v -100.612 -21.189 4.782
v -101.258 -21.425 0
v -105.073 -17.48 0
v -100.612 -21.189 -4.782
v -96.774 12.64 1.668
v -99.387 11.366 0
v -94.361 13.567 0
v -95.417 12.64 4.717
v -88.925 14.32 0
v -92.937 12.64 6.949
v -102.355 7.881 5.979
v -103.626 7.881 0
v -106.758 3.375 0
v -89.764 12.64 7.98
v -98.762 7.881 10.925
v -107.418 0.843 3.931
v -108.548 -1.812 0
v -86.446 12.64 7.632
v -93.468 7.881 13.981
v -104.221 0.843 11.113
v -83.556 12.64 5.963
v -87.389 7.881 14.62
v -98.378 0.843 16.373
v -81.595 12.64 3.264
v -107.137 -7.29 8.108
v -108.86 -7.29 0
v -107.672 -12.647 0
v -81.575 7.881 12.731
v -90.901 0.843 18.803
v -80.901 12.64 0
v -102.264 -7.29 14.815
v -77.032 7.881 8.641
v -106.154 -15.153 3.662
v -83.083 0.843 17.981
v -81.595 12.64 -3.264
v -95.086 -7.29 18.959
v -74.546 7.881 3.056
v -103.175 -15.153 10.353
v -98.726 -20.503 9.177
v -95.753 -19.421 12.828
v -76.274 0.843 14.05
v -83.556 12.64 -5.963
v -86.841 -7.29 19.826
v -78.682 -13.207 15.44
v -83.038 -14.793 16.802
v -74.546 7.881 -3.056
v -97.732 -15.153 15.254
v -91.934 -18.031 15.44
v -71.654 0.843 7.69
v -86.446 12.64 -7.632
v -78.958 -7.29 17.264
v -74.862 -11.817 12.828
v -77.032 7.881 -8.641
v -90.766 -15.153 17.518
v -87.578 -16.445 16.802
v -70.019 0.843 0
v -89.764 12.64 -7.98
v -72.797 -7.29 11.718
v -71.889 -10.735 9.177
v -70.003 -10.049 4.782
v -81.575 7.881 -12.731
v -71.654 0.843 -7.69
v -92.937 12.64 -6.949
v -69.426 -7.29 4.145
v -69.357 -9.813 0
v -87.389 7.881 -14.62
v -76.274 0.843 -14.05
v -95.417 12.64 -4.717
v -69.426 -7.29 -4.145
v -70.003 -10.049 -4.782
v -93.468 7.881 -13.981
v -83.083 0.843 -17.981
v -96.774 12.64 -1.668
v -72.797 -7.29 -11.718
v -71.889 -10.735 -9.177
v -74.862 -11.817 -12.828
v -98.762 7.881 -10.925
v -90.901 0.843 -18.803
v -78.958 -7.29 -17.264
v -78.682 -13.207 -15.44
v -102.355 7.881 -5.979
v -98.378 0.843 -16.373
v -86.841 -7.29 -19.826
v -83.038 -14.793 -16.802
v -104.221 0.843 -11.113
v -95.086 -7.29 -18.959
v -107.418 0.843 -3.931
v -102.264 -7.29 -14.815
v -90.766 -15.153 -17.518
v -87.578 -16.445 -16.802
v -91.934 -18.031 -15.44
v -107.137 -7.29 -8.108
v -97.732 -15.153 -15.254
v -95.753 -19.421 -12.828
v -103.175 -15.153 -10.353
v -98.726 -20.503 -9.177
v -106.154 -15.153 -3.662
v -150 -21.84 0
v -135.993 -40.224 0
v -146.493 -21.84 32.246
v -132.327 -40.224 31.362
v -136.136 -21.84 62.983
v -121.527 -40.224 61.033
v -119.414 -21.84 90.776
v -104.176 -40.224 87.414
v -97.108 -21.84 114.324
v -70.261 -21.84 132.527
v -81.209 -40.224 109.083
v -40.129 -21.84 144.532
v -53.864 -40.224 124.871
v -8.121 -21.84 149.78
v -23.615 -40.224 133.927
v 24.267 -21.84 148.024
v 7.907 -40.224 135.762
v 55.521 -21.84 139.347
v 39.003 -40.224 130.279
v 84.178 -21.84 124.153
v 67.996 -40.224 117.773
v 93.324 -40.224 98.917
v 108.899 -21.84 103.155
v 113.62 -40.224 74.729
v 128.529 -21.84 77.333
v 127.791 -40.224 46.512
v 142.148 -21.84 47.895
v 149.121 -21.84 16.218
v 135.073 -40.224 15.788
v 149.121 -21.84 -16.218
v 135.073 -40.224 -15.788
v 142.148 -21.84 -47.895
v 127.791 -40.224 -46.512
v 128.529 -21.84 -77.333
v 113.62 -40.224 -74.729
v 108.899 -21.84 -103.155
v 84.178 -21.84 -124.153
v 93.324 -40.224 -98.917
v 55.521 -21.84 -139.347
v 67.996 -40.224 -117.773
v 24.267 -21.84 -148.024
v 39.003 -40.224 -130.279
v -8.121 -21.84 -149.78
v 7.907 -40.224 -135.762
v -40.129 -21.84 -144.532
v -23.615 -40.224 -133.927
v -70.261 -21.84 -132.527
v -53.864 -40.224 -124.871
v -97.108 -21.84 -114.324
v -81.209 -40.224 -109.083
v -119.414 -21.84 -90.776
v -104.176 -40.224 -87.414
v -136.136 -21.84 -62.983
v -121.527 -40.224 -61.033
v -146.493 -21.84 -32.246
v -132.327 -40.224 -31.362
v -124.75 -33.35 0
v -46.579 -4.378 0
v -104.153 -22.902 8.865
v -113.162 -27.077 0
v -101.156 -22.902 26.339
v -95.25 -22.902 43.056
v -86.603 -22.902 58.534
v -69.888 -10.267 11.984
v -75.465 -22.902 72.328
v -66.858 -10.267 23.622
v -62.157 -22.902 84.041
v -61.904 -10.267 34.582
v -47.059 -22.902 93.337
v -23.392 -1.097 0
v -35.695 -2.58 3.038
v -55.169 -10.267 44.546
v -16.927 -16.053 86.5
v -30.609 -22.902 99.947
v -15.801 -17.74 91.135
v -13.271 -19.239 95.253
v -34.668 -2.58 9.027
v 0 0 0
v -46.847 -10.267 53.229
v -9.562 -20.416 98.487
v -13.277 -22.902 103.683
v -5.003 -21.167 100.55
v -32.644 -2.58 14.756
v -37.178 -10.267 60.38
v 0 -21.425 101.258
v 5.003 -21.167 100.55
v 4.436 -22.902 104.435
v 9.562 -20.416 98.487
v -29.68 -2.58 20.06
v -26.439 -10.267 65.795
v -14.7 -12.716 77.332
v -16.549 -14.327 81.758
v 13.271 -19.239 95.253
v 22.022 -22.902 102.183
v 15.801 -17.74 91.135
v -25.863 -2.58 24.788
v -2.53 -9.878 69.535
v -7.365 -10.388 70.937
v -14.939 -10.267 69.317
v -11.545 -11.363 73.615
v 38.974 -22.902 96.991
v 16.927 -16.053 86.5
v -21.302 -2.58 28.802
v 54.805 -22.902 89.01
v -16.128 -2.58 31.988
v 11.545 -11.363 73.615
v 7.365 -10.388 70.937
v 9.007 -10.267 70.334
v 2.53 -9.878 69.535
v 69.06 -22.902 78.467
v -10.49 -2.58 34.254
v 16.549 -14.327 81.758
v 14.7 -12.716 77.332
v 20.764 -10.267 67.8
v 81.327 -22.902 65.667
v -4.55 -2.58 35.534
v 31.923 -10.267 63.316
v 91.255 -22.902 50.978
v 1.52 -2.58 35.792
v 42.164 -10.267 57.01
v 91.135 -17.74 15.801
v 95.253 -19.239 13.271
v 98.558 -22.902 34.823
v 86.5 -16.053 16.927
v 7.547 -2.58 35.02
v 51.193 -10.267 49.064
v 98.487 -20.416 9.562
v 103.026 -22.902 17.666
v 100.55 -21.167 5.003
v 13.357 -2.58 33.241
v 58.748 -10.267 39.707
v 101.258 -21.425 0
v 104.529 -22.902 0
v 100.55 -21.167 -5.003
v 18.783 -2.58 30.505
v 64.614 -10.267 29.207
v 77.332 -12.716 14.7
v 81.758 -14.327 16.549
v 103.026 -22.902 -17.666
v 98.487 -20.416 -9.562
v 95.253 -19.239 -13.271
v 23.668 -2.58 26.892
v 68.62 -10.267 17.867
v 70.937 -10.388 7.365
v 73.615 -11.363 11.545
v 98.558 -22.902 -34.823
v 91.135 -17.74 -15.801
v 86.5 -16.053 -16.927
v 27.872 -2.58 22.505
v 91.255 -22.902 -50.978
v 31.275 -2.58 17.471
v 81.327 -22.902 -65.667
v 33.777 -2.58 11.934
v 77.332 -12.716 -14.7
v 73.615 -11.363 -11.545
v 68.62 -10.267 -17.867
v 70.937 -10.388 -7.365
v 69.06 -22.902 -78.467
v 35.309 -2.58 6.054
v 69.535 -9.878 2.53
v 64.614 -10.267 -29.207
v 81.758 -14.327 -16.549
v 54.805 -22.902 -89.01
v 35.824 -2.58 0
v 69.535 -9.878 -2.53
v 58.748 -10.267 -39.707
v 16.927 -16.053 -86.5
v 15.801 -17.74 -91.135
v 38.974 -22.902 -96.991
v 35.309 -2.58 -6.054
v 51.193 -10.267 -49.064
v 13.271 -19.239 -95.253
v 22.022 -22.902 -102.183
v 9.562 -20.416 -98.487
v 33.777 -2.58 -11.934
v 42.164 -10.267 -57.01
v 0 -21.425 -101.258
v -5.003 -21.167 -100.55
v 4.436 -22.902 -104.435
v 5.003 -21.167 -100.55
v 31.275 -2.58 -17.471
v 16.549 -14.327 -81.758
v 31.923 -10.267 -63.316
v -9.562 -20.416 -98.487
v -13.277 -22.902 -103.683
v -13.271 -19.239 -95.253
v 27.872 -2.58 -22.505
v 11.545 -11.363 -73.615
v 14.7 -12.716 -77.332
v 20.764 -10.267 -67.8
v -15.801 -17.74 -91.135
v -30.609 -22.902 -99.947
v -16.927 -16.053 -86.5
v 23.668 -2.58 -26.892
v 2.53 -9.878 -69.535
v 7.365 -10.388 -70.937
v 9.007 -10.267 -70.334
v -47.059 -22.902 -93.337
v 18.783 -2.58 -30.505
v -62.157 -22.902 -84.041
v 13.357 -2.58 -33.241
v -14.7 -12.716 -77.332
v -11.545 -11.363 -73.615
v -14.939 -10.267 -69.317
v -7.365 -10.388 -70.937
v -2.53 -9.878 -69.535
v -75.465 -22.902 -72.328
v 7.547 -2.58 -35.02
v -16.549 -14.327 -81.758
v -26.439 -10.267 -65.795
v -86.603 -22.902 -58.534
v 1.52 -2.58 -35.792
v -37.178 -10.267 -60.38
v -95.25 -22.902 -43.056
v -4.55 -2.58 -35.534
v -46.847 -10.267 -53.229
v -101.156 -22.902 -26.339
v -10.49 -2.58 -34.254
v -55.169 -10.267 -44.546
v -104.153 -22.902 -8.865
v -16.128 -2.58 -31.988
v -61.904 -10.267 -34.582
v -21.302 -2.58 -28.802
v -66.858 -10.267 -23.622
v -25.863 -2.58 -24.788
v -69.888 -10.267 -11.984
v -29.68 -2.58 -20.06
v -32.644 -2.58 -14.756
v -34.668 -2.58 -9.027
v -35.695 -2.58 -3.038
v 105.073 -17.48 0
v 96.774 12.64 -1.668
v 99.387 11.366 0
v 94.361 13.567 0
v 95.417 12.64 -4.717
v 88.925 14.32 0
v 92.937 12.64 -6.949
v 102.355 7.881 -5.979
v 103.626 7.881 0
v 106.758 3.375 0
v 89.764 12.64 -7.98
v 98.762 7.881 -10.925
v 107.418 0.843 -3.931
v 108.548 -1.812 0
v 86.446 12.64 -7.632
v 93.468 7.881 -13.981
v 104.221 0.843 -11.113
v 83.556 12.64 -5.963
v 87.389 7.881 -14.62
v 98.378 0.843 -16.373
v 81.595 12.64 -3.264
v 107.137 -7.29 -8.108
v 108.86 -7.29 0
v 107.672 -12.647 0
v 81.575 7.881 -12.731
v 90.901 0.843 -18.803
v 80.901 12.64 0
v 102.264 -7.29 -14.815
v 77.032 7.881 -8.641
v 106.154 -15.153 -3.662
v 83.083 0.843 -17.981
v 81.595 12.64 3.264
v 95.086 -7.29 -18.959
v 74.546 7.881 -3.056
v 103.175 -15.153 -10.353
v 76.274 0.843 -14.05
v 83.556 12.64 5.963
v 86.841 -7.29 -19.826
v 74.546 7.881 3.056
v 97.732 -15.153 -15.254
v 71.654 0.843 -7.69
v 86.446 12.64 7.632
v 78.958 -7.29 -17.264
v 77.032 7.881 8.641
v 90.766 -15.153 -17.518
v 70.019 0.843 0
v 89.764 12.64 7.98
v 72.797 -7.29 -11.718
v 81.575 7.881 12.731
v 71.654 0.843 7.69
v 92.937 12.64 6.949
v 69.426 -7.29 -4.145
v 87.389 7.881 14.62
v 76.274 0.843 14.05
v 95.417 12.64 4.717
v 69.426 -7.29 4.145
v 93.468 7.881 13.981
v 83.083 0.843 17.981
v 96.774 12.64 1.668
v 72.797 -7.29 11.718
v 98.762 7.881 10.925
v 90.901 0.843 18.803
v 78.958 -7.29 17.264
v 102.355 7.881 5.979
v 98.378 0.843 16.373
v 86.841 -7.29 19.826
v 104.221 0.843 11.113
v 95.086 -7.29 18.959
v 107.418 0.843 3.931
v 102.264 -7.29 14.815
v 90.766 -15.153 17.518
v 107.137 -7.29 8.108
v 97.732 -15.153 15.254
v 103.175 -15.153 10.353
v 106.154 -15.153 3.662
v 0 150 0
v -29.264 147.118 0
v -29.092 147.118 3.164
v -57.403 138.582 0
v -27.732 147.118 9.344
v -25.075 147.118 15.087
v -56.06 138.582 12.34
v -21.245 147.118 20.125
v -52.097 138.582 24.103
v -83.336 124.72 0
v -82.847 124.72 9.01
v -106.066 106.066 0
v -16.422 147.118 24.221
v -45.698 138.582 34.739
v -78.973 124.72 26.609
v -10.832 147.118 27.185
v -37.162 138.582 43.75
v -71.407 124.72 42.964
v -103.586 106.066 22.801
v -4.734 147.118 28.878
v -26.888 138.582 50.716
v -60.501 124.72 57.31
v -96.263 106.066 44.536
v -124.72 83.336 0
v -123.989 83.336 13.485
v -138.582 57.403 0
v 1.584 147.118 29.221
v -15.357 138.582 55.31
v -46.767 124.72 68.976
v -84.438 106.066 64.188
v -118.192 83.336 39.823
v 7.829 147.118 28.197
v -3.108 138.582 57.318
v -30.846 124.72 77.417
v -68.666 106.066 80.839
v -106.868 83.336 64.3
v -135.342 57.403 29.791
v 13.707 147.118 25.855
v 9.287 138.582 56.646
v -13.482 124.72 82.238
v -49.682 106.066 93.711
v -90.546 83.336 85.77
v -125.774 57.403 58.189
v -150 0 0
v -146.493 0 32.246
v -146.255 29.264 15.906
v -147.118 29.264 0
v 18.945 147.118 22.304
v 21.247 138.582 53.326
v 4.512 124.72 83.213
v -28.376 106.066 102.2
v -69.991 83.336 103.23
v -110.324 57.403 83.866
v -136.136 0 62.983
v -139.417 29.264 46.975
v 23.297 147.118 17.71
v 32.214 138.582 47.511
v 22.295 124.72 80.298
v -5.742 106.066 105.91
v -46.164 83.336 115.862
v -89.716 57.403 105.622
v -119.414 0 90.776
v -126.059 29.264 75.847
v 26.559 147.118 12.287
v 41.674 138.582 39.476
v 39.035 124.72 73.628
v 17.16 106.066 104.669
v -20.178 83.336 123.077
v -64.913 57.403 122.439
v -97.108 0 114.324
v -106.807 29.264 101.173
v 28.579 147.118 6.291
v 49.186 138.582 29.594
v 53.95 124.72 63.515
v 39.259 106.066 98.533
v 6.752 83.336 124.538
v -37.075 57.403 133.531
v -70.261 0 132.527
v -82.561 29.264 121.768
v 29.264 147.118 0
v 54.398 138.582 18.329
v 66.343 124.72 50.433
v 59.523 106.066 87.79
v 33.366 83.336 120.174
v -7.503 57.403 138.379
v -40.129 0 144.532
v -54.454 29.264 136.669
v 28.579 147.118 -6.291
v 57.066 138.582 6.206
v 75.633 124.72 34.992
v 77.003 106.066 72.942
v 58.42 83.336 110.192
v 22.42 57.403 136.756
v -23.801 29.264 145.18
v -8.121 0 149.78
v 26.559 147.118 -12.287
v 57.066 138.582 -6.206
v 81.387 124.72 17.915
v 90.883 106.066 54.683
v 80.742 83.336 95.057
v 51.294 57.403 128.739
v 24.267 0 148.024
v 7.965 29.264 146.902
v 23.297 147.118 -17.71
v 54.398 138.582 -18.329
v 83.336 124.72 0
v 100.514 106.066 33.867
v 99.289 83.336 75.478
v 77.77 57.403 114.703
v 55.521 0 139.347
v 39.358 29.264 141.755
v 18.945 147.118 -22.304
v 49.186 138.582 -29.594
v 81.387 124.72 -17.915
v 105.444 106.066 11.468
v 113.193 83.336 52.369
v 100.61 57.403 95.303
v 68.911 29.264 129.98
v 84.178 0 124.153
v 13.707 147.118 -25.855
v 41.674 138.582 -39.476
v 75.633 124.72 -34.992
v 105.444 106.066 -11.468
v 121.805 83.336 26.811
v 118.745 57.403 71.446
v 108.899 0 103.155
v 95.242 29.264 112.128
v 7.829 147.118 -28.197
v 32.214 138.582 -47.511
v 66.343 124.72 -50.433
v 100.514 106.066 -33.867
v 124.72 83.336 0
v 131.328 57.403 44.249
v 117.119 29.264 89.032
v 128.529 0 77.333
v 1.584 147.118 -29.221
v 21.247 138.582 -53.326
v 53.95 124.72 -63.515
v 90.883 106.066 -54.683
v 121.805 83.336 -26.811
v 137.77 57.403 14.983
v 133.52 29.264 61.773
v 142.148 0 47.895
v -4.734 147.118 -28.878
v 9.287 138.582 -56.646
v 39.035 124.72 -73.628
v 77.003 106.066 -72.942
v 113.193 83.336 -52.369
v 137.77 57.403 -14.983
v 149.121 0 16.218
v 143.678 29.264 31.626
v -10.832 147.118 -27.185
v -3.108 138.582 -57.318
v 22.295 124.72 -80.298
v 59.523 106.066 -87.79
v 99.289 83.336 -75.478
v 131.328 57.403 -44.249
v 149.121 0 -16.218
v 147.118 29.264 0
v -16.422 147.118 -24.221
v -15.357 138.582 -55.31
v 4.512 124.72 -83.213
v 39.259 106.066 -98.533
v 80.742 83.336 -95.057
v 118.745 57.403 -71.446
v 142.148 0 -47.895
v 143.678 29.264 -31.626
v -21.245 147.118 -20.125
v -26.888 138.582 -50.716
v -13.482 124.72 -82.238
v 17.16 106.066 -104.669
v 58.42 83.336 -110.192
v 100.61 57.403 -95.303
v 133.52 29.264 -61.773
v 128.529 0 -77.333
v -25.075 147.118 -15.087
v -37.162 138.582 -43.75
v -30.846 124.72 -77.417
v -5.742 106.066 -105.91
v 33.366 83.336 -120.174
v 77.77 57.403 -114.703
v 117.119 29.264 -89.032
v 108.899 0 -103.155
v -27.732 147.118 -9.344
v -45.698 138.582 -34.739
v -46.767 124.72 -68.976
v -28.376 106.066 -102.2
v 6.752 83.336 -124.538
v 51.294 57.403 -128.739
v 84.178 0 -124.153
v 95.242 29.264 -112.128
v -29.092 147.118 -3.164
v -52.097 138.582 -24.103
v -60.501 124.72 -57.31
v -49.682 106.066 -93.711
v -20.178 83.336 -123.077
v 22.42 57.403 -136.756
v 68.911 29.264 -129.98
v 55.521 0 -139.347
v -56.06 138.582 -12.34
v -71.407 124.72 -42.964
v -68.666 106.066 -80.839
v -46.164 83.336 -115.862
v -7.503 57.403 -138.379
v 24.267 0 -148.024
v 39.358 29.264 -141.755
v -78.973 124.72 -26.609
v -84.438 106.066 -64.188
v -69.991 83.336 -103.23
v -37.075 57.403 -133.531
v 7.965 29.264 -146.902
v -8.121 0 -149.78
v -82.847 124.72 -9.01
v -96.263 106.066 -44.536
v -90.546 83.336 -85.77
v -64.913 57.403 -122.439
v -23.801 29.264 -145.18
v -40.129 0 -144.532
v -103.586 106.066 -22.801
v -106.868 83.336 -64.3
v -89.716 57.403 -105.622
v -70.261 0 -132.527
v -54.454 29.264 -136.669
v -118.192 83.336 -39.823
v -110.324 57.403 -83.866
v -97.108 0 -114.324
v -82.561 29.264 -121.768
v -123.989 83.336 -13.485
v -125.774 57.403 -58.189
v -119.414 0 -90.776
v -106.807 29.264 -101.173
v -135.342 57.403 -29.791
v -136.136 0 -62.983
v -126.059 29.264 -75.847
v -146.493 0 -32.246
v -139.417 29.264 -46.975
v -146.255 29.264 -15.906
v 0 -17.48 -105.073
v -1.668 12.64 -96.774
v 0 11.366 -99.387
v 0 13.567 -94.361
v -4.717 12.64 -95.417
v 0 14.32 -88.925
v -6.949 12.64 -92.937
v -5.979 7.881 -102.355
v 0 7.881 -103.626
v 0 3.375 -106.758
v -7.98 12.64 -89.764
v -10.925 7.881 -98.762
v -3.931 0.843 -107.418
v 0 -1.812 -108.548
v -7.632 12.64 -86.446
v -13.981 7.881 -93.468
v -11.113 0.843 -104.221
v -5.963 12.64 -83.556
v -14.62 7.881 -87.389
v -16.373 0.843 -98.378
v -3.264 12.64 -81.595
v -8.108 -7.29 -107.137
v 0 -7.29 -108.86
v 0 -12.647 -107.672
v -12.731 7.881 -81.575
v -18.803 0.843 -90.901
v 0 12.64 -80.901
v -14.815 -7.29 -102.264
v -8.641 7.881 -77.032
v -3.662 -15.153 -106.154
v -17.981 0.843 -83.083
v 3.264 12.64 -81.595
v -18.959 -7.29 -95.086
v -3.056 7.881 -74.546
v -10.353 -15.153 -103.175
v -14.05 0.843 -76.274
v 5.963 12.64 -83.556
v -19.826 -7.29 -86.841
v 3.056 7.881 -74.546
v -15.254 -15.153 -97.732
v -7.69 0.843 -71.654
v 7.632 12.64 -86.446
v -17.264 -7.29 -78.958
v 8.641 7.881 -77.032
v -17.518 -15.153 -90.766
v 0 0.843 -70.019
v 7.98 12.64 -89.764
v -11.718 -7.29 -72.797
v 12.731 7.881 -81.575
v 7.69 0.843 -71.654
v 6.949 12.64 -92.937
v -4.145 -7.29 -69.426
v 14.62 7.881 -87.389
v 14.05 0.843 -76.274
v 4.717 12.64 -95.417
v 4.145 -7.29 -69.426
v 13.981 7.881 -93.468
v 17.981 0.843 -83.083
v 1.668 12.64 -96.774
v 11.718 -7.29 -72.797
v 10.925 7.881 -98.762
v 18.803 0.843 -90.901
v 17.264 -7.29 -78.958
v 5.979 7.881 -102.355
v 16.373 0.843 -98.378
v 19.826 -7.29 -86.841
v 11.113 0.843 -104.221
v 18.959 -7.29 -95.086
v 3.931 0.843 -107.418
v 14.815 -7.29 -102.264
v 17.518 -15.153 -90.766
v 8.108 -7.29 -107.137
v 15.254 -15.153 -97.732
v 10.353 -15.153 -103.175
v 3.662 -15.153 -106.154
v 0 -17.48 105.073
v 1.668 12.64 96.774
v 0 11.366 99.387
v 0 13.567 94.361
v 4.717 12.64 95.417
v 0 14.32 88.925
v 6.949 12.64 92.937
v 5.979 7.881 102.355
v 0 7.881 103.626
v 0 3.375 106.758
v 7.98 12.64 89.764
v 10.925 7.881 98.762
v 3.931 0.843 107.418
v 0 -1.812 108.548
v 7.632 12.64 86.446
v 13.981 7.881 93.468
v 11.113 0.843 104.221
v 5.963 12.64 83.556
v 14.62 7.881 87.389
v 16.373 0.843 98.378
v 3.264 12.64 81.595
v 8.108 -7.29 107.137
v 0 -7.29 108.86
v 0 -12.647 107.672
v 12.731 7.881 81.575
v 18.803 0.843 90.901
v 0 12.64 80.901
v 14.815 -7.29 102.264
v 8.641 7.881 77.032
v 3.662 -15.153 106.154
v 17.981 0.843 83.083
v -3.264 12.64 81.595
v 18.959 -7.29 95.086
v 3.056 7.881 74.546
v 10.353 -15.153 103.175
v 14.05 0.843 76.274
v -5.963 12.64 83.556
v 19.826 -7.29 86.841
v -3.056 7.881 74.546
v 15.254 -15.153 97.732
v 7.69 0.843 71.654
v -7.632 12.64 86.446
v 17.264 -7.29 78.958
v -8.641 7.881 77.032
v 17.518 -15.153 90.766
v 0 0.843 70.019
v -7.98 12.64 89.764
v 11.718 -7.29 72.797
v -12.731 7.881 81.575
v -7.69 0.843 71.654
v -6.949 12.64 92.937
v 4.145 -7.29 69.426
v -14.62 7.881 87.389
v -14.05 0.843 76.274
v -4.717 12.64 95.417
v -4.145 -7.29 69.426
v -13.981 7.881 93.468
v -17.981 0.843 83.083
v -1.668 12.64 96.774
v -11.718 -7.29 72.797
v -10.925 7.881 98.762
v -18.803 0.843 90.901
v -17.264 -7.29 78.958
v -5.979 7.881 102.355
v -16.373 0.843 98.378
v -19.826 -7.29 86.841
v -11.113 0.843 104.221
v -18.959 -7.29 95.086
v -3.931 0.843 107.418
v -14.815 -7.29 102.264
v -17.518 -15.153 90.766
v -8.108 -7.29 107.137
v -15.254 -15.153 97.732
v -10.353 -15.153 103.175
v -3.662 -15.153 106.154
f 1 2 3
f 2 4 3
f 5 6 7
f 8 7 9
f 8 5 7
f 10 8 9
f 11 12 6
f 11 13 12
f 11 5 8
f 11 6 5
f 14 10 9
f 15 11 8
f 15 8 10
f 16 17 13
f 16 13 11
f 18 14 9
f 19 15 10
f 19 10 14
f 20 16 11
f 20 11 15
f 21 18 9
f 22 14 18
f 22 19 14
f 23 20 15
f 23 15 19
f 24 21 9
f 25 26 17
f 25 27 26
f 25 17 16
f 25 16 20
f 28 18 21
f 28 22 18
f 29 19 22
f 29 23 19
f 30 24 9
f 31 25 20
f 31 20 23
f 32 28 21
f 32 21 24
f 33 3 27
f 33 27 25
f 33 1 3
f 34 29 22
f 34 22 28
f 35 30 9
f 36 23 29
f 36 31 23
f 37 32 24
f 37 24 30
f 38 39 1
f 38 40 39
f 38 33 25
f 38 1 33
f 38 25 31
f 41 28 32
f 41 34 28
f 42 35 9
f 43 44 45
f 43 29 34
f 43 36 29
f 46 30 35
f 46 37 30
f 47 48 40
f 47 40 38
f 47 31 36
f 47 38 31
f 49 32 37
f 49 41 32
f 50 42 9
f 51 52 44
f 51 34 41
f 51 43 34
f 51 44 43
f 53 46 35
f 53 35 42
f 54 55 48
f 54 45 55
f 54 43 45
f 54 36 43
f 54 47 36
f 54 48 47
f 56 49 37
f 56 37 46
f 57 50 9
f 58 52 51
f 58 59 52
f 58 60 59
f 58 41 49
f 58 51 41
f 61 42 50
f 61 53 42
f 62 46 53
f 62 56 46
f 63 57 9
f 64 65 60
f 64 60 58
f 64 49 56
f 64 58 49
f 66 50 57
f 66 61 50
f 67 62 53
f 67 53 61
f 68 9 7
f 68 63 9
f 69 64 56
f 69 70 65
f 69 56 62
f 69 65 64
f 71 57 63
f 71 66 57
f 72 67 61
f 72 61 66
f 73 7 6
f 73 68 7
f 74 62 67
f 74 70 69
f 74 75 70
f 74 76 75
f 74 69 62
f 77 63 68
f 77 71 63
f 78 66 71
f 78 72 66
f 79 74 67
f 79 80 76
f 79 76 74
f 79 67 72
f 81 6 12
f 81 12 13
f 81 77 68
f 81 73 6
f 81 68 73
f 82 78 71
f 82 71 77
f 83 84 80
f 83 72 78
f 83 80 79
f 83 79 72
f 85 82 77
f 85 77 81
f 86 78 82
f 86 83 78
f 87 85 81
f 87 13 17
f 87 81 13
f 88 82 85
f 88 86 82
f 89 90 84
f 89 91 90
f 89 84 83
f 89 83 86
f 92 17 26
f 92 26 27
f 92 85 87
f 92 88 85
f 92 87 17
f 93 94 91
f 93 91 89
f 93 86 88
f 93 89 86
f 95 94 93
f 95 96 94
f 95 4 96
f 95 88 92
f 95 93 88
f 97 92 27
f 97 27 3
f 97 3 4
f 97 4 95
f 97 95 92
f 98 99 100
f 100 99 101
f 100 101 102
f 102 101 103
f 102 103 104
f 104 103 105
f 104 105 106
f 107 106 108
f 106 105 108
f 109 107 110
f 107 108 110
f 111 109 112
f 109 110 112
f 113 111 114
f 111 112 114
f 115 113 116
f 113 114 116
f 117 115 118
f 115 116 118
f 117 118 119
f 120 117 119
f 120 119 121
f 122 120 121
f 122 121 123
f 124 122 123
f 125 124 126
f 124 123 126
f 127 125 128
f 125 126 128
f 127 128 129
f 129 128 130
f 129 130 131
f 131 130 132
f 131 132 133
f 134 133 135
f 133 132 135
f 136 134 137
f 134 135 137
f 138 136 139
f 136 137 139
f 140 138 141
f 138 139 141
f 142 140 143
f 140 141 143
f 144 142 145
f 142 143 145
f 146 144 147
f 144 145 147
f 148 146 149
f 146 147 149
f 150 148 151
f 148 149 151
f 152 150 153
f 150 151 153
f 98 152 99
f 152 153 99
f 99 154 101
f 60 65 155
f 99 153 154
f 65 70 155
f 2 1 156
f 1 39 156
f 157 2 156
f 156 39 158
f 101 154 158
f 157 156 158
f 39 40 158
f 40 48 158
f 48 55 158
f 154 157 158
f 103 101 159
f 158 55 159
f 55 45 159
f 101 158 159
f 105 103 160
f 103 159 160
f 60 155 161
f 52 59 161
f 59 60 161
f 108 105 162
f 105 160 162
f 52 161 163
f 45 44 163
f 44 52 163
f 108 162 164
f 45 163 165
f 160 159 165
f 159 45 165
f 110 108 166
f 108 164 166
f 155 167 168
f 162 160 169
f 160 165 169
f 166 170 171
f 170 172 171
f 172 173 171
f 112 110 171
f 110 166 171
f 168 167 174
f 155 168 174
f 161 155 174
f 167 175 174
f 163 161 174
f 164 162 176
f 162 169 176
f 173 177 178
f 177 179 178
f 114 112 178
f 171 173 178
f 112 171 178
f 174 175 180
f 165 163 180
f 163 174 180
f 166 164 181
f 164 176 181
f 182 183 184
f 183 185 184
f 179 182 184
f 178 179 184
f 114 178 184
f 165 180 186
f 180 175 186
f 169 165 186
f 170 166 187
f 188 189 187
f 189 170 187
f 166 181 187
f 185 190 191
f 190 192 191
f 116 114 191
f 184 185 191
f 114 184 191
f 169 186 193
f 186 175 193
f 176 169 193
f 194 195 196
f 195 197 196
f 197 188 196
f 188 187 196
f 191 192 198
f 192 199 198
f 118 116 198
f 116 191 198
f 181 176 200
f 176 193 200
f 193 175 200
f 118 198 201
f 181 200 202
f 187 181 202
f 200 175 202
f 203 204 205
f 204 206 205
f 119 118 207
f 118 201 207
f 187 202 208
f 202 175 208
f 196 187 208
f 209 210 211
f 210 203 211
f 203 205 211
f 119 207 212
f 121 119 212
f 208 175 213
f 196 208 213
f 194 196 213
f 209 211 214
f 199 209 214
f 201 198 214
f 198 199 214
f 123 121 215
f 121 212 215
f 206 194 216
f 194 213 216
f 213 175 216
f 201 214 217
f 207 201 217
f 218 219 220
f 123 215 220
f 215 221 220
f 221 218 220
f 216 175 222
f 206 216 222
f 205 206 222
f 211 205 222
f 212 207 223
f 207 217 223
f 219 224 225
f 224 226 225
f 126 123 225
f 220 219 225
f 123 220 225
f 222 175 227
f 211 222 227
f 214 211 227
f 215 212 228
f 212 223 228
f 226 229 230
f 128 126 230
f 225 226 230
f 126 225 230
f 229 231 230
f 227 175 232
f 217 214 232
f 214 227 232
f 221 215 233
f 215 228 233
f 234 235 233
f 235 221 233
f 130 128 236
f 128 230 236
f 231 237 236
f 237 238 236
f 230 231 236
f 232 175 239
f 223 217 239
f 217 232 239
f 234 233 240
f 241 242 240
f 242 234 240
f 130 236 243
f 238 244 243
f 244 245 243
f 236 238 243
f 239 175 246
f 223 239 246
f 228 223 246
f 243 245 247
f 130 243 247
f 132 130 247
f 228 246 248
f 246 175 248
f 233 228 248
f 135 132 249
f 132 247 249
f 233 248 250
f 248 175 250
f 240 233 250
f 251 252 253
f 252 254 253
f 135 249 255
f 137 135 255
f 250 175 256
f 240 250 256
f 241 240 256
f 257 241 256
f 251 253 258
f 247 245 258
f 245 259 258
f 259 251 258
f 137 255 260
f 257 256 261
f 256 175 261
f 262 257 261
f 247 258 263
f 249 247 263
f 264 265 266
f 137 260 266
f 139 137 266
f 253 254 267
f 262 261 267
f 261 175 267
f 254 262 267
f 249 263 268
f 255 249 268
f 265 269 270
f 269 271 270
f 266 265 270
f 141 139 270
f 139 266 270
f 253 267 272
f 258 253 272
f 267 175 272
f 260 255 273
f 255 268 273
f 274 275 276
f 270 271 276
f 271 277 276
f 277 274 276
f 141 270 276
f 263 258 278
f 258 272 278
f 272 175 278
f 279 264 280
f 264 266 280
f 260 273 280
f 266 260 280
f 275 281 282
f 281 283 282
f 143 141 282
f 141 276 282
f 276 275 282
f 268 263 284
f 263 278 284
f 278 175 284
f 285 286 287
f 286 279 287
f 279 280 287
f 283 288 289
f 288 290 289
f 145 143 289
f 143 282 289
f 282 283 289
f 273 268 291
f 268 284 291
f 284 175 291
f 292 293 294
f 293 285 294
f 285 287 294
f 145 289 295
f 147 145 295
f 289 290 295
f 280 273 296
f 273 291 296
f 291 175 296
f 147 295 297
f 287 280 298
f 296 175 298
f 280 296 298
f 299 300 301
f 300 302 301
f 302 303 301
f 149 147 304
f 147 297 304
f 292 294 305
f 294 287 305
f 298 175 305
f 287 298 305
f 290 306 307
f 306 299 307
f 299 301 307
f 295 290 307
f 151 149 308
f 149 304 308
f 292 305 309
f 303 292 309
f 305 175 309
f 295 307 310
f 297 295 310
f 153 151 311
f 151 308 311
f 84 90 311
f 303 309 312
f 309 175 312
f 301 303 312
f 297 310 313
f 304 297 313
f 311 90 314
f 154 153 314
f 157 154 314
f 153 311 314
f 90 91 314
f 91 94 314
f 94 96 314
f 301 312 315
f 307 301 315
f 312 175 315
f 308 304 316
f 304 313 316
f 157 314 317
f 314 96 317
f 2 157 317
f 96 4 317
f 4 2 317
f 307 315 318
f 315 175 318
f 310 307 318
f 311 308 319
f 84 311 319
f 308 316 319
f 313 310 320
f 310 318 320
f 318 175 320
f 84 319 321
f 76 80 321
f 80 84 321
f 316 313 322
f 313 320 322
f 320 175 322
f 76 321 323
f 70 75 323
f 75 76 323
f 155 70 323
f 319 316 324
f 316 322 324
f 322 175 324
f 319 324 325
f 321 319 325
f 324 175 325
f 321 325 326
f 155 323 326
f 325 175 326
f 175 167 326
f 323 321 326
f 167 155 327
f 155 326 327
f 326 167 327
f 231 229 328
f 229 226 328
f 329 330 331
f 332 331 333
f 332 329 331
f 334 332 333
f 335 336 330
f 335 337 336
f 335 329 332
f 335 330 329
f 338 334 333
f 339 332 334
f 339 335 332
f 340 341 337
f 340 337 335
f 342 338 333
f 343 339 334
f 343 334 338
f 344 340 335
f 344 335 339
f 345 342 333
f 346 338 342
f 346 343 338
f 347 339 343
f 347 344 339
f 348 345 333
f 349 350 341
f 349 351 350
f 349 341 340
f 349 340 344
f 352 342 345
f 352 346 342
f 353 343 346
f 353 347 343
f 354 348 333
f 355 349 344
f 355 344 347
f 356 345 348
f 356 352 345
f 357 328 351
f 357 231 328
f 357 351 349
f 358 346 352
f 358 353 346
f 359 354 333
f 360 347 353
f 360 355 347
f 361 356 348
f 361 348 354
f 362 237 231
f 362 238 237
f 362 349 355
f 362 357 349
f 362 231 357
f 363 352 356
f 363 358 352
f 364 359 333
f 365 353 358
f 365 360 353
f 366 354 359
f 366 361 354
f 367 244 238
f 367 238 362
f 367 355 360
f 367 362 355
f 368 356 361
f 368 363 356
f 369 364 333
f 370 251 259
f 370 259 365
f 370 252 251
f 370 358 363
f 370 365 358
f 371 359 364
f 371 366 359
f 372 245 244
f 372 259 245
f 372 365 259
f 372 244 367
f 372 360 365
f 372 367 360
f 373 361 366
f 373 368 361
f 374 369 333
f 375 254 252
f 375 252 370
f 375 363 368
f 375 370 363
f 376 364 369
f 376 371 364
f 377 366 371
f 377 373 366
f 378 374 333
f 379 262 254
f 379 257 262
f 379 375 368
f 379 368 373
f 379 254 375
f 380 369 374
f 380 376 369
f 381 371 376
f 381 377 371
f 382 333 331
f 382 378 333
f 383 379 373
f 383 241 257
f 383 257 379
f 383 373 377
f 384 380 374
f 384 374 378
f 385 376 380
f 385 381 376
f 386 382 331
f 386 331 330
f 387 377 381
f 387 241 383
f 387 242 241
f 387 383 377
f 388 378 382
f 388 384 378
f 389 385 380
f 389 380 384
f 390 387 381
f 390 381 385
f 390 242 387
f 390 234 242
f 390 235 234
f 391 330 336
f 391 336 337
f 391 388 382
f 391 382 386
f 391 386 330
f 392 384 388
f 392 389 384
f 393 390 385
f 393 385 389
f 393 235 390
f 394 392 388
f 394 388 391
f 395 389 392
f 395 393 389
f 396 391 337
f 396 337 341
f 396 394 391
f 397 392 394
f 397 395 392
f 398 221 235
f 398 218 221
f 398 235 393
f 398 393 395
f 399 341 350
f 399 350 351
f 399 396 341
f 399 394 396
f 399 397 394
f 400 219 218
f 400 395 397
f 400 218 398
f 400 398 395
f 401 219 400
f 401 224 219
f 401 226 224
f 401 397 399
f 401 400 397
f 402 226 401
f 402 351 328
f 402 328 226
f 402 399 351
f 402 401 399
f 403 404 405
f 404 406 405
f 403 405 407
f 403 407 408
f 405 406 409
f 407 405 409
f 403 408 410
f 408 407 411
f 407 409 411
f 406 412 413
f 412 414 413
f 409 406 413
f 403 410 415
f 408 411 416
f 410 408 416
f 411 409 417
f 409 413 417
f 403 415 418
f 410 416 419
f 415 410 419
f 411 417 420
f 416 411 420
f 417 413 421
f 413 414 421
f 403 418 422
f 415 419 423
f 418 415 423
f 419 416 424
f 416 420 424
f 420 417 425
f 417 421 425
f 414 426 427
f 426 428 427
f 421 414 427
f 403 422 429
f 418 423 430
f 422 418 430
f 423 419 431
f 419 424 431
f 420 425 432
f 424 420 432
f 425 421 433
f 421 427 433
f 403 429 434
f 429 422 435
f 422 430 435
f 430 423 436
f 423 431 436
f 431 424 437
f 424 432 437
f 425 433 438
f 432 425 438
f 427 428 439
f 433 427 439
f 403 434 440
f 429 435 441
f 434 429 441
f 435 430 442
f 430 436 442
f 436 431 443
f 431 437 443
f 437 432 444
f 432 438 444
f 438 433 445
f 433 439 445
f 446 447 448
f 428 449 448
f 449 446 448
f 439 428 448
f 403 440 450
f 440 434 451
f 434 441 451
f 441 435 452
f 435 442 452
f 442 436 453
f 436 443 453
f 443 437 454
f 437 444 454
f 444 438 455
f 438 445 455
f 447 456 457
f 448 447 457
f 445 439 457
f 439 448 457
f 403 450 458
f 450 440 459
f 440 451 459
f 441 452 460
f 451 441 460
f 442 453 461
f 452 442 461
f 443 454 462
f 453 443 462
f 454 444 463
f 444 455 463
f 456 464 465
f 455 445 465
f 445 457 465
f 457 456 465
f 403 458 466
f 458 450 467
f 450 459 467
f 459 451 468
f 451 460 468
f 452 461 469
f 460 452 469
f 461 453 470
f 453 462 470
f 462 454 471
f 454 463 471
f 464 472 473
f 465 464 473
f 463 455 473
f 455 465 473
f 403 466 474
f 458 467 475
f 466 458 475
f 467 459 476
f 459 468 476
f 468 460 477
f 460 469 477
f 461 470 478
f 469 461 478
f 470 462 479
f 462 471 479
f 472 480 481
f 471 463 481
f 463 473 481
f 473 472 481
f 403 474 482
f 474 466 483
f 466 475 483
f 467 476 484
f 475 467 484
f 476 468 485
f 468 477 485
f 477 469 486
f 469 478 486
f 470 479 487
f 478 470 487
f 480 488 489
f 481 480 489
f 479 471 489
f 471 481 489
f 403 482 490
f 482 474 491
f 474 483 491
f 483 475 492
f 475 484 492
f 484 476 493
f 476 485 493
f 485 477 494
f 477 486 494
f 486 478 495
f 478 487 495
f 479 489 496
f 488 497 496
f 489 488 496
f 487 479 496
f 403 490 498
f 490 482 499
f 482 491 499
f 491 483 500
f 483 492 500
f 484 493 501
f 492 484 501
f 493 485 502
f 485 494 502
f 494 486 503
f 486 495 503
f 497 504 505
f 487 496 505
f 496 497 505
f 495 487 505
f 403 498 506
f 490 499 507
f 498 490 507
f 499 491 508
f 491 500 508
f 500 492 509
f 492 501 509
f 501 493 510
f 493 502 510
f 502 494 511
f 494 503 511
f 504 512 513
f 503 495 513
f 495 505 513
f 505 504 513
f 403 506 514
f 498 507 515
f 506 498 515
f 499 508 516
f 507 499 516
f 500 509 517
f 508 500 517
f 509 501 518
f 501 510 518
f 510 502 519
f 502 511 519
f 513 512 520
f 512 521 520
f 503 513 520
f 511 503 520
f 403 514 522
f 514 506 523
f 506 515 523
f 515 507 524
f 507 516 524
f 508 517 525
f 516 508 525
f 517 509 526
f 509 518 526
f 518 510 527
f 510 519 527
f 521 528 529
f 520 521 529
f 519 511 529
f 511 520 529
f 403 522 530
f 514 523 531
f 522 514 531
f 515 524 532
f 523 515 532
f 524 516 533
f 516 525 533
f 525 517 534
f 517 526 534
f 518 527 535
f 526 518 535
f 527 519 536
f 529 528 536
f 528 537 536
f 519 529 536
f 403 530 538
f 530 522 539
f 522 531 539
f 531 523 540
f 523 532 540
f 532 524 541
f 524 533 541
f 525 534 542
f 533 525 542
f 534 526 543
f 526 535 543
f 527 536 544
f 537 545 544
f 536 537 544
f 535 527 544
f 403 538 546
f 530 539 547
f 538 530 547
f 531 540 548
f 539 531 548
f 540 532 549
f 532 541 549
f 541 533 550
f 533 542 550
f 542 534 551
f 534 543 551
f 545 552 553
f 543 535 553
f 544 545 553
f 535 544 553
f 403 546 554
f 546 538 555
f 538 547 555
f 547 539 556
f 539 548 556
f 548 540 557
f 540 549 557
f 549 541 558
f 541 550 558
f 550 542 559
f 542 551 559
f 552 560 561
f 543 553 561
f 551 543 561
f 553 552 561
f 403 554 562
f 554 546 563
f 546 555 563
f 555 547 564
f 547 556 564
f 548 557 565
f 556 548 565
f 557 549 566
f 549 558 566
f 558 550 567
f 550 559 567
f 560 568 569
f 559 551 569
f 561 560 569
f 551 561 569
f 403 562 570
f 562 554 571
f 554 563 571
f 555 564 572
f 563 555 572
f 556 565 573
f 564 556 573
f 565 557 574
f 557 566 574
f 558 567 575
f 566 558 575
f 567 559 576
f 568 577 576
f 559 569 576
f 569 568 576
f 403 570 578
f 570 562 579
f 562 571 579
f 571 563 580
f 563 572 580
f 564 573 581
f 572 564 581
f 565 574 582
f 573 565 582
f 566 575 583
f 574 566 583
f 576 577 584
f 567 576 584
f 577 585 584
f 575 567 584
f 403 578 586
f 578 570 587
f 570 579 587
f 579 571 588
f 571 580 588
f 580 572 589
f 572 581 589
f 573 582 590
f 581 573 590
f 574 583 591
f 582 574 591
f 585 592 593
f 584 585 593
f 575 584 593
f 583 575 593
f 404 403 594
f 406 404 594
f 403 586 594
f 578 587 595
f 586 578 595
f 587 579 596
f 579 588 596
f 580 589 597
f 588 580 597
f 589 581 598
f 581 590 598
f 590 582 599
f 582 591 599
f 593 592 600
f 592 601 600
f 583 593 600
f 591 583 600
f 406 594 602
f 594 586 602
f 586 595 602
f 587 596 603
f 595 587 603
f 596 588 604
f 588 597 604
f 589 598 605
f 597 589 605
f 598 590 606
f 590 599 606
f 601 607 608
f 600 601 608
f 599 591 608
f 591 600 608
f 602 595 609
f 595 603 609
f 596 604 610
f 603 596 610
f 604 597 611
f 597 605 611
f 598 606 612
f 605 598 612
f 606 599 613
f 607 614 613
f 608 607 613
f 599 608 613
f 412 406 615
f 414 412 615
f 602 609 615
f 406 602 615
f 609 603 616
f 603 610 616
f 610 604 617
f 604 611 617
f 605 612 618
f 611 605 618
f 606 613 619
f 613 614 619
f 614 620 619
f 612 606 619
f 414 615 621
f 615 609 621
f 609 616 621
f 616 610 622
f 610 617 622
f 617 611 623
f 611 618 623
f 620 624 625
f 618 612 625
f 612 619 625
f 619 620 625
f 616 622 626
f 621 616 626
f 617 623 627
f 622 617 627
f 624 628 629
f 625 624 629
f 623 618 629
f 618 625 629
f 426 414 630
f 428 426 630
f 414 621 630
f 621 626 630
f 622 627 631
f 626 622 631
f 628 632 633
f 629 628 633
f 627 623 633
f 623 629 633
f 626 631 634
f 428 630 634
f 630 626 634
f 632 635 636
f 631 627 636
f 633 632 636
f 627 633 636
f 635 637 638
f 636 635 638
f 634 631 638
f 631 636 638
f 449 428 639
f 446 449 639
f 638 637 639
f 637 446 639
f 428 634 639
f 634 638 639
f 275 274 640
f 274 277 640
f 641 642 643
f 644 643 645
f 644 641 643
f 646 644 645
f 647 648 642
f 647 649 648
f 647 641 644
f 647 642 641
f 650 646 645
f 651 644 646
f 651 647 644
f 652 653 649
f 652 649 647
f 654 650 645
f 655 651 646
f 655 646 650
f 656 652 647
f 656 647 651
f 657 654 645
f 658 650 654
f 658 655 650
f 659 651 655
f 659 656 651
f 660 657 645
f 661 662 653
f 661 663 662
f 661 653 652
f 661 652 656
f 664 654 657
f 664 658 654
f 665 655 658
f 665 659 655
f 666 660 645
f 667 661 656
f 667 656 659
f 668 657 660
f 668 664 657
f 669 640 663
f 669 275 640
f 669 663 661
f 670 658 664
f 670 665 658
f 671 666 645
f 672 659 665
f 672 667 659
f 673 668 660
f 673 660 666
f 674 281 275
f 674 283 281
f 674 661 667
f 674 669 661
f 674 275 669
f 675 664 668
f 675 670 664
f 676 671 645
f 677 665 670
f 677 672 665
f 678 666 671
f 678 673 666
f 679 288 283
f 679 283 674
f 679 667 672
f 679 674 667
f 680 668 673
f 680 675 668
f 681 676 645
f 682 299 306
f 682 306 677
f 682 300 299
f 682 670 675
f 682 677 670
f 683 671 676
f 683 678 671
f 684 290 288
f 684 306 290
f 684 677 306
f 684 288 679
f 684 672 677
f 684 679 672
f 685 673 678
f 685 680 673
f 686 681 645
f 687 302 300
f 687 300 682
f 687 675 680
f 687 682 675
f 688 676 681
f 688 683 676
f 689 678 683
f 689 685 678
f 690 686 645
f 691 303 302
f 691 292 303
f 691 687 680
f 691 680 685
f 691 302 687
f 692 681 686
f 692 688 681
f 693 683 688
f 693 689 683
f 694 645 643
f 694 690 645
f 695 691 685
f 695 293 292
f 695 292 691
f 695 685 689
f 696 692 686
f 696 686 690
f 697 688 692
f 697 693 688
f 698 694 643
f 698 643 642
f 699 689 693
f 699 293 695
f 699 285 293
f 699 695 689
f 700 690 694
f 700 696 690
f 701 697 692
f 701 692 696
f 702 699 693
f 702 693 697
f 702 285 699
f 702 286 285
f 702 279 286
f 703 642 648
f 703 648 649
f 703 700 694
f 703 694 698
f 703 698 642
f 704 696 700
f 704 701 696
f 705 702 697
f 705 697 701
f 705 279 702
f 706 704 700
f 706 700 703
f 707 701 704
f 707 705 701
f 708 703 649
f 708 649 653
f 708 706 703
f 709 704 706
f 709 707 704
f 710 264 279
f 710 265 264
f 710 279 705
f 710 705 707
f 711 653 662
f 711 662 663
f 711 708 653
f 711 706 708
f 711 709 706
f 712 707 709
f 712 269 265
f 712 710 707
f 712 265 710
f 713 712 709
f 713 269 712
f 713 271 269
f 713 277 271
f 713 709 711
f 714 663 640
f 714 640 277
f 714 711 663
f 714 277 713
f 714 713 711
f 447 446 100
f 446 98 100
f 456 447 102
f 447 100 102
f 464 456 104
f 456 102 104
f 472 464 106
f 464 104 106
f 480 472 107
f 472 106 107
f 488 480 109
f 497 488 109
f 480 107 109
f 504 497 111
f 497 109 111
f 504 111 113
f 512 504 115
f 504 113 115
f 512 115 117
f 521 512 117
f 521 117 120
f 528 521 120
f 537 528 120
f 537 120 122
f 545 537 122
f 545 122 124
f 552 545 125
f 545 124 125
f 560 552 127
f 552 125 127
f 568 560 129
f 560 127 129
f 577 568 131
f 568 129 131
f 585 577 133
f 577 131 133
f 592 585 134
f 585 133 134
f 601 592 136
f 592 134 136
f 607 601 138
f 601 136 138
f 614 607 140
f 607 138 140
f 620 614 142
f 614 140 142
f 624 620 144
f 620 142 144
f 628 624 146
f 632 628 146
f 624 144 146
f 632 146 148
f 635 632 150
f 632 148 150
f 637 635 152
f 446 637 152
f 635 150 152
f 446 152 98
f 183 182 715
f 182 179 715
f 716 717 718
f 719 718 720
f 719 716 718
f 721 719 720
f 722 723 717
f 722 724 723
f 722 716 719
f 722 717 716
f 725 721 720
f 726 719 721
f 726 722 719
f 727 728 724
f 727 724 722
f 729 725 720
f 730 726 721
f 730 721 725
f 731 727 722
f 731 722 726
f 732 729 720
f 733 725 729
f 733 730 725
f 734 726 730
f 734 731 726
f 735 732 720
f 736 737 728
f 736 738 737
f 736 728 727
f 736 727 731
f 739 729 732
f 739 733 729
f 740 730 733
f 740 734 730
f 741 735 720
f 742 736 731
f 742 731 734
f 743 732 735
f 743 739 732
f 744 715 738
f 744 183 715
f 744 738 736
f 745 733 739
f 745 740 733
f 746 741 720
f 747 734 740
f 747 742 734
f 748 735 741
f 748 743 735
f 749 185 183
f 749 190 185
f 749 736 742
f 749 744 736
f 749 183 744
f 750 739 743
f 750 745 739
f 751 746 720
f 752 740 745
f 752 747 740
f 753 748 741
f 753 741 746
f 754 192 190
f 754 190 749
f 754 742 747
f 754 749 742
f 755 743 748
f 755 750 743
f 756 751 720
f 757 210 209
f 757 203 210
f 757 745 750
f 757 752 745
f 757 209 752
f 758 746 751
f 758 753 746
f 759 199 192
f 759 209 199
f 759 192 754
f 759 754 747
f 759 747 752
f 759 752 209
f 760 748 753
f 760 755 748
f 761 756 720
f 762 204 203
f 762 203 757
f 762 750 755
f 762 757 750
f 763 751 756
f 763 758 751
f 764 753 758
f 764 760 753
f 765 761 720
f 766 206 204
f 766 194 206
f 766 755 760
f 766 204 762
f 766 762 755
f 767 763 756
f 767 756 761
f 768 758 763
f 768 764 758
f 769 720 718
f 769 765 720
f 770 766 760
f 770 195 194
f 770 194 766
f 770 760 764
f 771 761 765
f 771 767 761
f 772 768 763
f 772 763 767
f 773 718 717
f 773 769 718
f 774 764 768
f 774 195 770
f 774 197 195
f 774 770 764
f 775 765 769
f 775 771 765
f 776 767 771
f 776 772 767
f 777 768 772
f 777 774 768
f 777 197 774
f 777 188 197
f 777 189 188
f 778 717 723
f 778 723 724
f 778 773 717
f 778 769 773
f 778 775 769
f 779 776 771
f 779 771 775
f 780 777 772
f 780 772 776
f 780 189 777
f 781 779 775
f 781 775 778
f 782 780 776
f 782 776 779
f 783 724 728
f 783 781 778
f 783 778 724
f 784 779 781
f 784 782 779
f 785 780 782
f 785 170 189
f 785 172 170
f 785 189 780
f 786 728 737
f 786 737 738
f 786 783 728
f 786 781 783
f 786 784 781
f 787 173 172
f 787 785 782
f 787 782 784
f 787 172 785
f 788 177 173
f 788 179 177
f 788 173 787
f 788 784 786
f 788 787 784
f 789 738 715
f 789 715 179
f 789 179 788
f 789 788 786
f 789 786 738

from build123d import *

# Parameters (mm, degrees)
CIRPATTERN2_COUNT = 4


with BuildPart() as part:
    # Sketch1 → Revolve1 (revolve)
    with BuildSketch(Plane.XY):
        with BuildLine():
            Line((-150, 0), (-150, -21.839688718))
            Line((-150, -21.839688718), (-135.992561225, -40.2238734))
            ThreePointArc((-135.992561225, -40.2238734), (-70.908280017, -10.266781974), (0, 0))
            Line((0, 0), (0, 150))
            ThreePointArc((0, 150), (-106.066017178, 106.066017178), (-150, 0))
        make_face()
    revolve(axis=Axis((0, 0, 0), (0, 1, 0)))

    # Sketch2 → Cut-Revolve2 (revolve, cut)
    with BuildSketch(Plane.XY):
        with BuildLine():
            Line((88.925237265, -25.679918596), (88.925237265, 14.320081404))
            ThreePointArc((88.925237265, 14.320081404), (108.925237265, -5.679918596), (88.925237265, -25.679918596))
        make_face()
    cut_revolve2 = revolve(axis=Axis((88.925237265, -25.679918596, 0), (0, 1, 0)), mode=Mode.SUBTRACT)

    # CirPattern2: Cut-Revolve2 ×4 about axis
    cirpattern2_axis = Axis((0, 0, 0), (0, 1, 0))
    for i in range(1, CIRPATTERN2_COUNT):
        add(cut_revolve2.rotate(cirpattern2_axis, i * 360 / CIRPATTERN2_COUNT), mode=Mode.SUBTRACT)


solid = part.part
